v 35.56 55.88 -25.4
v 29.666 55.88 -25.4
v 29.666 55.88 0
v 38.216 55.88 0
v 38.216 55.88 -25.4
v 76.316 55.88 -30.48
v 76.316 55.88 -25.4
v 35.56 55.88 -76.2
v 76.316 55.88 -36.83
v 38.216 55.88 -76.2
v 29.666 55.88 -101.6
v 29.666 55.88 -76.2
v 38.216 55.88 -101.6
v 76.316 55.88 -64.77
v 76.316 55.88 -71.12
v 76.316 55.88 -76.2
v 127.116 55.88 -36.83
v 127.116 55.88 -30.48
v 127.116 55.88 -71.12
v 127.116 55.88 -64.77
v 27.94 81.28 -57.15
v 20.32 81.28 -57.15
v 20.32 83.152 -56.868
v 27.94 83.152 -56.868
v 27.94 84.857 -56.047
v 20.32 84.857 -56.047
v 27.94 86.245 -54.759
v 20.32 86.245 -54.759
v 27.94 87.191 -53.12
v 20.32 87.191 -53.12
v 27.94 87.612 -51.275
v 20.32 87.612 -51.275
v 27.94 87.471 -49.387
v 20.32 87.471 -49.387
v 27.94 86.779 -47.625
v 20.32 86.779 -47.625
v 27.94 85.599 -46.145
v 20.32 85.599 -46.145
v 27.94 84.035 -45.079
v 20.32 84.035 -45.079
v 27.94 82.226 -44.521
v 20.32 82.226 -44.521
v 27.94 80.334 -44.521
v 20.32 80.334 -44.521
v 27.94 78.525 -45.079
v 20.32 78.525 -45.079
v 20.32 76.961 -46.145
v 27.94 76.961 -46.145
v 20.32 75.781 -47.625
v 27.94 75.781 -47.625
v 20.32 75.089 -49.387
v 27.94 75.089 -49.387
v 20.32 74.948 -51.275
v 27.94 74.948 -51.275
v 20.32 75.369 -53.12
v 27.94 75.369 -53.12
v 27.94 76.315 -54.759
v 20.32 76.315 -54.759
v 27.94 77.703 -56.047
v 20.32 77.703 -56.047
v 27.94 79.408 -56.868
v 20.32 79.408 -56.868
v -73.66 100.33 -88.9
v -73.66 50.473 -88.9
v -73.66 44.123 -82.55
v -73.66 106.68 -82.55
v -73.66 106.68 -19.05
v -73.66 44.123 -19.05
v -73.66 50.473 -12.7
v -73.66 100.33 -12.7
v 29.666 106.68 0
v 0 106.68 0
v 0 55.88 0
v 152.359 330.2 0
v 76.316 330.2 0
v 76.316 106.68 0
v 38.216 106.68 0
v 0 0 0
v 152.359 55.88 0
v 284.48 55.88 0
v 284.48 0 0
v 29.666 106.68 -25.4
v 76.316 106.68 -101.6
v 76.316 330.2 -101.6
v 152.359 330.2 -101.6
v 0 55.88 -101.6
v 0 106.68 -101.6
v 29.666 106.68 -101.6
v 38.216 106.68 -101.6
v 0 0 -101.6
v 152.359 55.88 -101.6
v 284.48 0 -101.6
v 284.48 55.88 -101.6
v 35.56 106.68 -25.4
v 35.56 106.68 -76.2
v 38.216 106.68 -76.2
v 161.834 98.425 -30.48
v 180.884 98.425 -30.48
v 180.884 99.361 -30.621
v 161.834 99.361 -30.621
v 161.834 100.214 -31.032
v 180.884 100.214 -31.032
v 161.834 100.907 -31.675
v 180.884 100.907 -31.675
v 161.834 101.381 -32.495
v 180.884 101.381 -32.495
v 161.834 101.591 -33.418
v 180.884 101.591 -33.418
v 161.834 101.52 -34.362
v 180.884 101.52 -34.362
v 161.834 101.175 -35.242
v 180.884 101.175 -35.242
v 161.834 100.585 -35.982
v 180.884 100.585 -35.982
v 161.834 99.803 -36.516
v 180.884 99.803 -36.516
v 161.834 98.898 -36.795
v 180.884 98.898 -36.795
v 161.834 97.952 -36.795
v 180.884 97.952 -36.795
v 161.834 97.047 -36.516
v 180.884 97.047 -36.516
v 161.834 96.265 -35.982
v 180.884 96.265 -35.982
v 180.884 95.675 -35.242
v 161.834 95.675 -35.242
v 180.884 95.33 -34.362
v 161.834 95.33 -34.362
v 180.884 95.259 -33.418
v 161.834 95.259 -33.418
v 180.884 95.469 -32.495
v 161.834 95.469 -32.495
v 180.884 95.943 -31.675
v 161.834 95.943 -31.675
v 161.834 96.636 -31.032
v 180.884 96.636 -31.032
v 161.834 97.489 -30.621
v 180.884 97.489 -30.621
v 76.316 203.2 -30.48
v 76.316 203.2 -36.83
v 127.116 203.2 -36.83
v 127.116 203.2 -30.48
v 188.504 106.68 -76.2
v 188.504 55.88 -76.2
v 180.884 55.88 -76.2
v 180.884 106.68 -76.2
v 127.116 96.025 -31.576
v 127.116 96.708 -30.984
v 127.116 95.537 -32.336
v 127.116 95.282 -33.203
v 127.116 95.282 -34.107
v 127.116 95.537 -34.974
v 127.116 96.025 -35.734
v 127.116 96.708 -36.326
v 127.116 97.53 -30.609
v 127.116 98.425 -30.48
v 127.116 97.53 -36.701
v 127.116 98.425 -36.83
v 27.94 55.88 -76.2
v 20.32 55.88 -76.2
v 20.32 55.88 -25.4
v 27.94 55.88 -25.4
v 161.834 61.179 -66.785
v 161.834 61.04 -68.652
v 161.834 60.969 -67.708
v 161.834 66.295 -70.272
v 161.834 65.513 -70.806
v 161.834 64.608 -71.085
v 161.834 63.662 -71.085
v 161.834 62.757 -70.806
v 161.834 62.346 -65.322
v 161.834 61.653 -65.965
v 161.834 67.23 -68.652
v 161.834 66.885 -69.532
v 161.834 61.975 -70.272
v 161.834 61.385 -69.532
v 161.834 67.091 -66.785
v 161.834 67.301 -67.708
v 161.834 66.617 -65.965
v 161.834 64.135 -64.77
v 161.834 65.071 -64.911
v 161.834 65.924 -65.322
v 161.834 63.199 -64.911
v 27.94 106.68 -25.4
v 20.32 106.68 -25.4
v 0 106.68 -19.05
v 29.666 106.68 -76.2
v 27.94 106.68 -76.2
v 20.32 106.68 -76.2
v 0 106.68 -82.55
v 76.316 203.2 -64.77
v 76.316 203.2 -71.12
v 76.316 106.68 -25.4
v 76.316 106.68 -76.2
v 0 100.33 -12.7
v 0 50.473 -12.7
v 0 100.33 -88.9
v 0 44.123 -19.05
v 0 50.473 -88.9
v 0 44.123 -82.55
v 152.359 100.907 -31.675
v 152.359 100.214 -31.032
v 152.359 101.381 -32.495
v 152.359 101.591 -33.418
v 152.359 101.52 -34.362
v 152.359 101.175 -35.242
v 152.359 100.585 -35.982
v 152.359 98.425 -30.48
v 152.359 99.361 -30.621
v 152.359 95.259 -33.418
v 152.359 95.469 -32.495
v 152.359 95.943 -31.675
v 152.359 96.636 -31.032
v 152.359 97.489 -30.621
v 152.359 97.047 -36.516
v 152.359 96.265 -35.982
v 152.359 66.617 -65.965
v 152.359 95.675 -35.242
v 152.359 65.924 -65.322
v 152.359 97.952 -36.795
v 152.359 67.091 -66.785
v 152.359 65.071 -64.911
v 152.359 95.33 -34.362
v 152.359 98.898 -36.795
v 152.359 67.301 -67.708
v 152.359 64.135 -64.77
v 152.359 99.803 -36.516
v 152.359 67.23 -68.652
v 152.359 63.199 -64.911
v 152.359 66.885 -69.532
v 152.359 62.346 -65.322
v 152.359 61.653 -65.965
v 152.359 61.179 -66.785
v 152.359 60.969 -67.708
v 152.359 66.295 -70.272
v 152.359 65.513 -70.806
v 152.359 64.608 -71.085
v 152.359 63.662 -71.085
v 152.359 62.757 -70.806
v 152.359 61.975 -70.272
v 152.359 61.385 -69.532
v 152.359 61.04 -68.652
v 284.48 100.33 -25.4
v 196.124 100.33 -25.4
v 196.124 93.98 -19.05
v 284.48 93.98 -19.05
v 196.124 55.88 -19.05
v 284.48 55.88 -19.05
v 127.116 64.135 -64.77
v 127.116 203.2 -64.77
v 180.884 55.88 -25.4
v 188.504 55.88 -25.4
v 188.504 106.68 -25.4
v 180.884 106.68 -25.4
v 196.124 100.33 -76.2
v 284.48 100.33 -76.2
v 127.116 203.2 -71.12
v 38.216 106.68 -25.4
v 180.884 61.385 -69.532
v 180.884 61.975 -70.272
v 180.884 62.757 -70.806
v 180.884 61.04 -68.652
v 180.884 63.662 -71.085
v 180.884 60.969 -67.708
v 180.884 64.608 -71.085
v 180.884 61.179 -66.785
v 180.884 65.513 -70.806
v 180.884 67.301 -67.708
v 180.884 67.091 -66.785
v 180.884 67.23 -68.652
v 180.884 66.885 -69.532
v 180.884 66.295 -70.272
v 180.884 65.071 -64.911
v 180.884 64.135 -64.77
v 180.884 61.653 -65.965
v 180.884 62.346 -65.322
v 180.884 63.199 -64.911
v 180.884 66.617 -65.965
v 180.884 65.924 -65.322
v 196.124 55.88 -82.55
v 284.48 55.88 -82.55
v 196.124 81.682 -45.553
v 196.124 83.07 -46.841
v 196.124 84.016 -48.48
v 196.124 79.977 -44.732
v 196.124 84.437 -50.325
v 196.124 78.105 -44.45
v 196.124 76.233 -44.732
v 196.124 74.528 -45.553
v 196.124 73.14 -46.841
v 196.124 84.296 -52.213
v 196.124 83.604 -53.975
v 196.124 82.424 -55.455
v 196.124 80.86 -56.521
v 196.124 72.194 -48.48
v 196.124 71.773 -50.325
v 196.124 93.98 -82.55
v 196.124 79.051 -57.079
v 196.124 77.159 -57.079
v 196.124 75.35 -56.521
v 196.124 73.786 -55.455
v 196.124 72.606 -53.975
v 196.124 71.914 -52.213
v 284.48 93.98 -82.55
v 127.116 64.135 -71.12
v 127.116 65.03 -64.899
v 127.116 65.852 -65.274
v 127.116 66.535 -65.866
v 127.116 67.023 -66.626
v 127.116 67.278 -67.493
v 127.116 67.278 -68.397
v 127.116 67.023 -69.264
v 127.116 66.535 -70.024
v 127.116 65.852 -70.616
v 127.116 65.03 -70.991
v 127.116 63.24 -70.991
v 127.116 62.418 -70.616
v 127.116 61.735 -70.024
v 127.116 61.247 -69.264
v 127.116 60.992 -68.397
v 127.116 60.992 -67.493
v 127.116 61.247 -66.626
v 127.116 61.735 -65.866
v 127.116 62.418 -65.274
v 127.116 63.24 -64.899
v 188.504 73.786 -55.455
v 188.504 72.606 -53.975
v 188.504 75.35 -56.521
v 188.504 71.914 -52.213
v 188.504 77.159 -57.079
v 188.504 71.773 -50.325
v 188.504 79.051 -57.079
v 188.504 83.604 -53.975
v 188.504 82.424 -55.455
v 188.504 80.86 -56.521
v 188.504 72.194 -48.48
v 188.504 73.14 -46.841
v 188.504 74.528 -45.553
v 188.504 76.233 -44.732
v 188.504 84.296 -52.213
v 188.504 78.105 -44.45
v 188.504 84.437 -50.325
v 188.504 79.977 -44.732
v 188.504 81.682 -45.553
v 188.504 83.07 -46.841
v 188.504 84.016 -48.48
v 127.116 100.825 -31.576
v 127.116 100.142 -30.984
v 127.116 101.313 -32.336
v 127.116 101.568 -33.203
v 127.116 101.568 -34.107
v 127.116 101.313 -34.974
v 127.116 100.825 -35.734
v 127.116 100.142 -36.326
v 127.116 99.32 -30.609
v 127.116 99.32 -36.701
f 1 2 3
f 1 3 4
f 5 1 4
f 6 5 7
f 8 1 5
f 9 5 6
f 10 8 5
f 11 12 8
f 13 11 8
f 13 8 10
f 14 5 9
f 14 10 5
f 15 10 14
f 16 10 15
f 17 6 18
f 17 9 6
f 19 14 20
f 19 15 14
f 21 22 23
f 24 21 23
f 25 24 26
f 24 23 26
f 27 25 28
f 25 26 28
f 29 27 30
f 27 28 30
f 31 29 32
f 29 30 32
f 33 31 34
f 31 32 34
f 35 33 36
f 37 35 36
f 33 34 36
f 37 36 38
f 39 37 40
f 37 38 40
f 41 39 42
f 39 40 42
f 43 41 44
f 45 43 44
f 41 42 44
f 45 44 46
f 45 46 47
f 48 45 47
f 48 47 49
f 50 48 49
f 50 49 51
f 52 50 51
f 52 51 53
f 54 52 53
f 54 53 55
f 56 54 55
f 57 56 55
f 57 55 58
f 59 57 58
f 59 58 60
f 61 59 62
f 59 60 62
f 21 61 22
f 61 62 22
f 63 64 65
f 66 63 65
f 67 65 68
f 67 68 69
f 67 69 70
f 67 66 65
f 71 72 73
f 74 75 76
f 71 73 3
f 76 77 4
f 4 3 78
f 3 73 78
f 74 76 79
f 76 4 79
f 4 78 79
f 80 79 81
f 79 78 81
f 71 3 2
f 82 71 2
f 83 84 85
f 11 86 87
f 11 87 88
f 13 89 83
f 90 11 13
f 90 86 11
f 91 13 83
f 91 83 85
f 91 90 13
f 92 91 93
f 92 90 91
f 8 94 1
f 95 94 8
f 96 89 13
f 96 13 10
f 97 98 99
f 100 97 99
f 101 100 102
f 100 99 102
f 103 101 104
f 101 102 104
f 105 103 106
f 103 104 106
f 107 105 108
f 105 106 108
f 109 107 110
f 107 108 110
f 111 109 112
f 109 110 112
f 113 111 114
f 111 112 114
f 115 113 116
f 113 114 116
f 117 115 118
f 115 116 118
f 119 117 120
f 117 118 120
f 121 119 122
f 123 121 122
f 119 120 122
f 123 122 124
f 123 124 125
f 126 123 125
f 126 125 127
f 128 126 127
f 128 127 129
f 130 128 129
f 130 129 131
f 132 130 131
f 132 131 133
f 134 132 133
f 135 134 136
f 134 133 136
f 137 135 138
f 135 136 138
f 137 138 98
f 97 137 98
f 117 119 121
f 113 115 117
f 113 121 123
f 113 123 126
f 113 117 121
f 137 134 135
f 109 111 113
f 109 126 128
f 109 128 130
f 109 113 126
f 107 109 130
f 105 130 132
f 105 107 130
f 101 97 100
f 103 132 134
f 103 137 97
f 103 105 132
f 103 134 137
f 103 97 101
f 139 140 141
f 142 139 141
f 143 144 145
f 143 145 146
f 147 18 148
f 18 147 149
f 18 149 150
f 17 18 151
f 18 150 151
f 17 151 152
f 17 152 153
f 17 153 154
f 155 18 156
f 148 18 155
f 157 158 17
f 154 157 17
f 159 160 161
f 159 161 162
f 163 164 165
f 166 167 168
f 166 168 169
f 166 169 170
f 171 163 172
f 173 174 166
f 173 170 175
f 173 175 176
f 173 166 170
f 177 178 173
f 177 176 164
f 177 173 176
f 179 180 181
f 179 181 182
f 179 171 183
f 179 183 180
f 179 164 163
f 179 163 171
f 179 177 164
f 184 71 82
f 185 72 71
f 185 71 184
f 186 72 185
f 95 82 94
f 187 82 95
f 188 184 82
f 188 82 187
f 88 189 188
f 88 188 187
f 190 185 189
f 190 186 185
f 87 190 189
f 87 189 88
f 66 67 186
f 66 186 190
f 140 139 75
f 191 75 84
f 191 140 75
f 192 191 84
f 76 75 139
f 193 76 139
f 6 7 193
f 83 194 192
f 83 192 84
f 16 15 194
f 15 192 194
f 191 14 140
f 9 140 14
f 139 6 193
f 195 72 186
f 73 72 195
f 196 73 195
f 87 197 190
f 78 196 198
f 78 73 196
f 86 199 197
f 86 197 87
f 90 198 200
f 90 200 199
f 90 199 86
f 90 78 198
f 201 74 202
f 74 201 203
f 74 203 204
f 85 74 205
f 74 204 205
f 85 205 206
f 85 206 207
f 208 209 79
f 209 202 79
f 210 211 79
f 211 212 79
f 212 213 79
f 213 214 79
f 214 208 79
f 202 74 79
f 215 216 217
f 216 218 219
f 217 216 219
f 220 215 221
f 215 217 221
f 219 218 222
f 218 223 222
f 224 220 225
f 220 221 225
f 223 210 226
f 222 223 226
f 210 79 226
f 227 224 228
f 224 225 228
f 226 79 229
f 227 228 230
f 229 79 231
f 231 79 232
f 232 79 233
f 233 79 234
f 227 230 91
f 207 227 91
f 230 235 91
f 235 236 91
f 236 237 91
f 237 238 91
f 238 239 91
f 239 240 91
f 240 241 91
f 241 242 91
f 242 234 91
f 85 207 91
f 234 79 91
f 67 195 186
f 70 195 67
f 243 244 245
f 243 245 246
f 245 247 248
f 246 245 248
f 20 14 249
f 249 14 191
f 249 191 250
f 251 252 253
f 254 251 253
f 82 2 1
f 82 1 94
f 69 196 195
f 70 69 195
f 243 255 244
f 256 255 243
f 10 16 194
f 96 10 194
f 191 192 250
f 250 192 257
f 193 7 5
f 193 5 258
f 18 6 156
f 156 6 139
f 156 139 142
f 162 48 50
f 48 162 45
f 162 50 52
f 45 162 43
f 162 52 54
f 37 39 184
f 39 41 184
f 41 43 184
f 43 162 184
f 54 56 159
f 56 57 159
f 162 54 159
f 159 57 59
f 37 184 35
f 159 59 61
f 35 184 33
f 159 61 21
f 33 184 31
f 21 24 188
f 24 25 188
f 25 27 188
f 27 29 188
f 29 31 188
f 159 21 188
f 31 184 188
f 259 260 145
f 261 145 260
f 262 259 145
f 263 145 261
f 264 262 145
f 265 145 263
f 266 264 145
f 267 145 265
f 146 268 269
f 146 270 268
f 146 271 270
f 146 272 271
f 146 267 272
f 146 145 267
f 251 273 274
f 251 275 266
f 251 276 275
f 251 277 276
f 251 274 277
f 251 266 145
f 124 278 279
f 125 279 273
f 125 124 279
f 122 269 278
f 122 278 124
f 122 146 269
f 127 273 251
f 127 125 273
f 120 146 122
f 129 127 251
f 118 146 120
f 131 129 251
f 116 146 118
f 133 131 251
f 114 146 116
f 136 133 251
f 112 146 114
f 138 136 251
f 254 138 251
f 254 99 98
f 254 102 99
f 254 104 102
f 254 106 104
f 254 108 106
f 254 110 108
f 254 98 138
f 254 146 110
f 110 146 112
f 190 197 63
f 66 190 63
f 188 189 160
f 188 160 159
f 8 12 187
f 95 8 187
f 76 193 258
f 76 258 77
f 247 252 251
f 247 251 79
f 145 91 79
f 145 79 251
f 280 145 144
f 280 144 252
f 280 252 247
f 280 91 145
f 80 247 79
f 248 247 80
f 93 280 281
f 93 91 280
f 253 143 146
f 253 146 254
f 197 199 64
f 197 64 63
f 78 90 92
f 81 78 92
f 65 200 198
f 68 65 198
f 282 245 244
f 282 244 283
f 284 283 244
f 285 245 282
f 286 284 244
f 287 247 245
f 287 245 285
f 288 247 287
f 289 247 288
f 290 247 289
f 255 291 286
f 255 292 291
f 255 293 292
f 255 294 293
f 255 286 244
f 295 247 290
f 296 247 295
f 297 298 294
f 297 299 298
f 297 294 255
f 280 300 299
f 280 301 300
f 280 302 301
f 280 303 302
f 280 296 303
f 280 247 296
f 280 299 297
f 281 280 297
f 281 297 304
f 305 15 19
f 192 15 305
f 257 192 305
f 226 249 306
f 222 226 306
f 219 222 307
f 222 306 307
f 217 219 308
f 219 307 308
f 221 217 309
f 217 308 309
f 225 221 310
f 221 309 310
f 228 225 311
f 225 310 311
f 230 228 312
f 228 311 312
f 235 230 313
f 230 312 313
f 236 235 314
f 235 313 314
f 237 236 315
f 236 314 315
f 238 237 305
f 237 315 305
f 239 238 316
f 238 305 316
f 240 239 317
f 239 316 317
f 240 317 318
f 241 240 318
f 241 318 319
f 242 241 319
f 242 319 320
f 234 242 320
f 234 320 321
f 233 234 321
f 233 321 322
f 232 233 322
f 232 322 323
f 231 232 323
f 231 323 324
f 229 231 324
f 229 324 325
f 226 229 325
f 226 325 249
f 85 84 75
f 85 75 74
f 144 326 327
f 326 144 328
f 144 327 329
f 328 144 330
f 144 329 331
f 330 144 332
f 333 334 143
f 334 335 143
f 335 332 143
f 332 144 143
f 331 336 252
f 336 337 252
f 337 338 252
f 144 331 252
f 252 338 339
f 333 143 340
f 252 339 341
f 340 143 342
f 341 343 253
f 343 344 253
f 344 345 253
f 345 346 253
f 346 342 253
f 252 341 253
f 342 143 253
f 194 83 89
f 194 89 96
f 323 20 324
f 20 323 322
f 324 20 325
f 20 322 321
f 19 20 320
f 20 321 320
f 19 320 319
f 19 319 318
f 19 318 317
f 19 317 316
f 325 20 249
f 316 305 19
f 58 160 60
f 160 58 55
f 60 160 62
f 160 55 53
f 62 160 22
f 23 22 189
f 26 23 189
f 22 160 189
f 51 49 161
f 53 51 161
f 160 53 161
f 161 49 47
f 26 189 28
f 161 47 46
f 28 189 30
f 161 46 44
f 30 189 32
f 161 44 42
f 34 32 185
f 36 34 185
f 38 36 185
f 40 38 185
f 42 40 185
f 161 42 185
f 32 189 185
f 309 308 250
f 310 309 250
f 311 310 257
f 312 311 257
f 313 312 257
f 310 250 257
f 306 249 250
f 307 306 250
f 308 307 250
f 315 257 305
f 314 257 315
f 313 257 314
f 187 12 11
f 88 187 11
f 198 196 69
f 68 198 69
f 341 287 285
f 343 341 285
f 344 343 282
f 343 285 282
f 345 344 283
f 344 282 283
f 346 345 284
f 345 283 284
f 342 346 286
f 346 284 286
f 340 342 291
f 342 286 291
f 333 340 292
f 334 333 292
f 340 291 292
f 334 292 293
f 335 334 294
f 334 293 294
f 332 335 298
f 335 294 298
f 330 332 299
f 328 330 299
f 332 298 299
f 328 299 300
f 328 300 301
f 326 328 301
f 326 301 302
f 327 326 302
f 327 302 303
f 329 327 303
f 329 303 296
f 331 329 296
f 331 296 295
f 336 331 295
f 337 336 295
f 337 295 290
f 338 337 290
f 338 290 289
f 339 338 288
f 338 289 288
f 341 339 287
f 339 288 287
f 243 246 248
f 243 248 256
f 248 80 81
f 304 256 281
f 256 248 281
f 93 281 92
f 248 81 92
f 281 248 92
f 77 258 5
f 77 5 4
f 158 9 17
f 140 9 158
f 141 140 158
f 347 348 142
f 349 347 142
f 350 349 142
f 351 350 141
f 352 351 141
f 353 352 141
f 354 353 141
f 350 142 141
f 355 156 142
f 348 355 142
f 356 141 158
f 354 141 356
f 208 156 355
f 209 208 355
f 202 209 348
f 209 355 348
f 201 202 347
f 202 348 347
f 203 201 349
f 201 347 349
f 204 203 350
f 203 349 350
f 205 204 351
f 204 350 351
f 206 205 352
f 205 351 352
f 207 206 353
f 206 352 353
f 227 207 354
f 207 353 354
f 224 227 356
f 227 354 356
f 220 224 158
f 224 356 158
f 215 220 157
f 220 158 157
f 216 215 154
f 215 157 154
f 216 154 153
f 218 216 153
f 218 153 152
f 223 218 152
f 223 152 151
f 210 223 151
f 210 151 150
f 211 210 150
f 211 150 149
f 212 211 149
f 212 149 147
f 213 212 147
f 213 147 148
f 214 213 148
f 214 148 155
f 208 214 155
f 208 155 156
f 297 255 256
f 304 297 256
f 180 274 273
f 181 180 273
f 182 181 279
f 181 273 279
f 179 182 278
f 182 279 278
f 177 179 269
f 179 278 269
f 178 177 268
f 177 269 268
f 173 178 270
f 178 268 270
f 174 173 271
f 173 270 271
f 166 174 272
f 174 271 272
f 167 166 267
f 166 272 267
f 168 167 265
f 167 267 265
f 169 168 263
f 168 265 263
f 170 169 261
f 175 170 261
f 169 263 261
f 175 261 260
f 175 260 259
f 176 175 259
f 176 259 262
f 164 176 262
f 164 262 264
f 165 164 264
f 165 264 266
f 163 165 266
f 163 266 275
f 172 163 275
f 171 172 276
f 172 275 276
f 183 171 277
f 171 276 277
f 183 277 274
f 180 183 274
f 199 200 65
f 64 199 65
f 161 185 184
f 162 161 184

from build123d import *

# Parameters (mm, degrees)
SKETCH1_W            = 284.48
SKETCH1_H            = 101.6
BOSS_EXTRUDE1_DEPTH  = 55.88
SKETCH2_W            = 76.042421072
SKETCH2_H            = 101.6
BOSS_EXTRUDE2_DEPTH  = 274.32
SKETCH3_W            = 68.280460578
SKETCH3_H            = 6.35
CUT_EXTRUDE1_DEPTH   = 147.32
SKETCH4_R            = 3.175
CUT_EXTRUDE2_DEPTH   = 274.32
SKETCH5_W            = 25.4
SKETCH5_H            = 50.8
BOSS_EXTRUDE4_DEPTH  = 38.1
SKETCH6_W            = 29.665893143
SKETCH6_H            = 25.4
BOSS_EXTRUDE5_DEPTH  = 50.8
SKETCH7_W            = 76.2
SKETCH7_H            = 62.556650574
BOSS_EXTRUDE6_DEPTH  = 93.98
SKETCH8_R            = 6.35
BOSS_EXTRUDE7_DEPTH  = 7.62
SKETCH9_W            = 50.8
SKETCH9_H            = 50.8
BOSS_EXTRUDE8_DEPTH  = 7.62
SKETCH11_W           = 88.356231919
SKETCH11_H           = 63.5
BOSS_EXTRUDE9_DEPTH  = 44.45
SKETCH13_R           = 6.35
BOSS_EXTRUDE10_DEPTH = 7.62
SKETCH14_W           = 50.8
SKETCH14_H           = 50.8
BOSS_EXTRUDE11_DEPTH = 7.62
SKETCH15_R           = 3.175
BOSS_EXTRUDE12_DEPTH = 19.05
CHAMFER2_SIZE        = 6.35


with BuildPart() as part:
    # Sketch1 → Boss-Extrude1 (new body)
    with BuildSketch(Plane(origin=(0, 0, 0), x_dir=(1, 0, 0), z_dir=(0, 1, 0))):
        with Locations((142.24, 50.8)):
            Rectangle(SKETCH1_W, SKETCH1_H)
    extrude(amount=BOSS_EXTRUDE1_DEPTH)

    # Sketch2 → Boss-Extrude2 (add)
    with BuildSketch(Plane(origin=(0, 55.88, 0), x_dir=(1, 0, 0), z_dir=(0, 1, 0))):
        with Locations((114.337337429, 50.8)):
            Rectangle(SKETCH2_W, SKETCH2_H)
    extrude(amount=BOSS_EXTRUDE2_DEPTH)

    # Sketch3 → Cut-Extrude1 (cut)
    with BuildSketch(Plane(origin=(0, 203.2, 0), x_dir=(1, 0, 0), z_dir=(0, 1, 0))):
        with Locations((92.975896604, 33.655)):
            Rectangle(SKETCH3_W, SKETCH3_H)
        with Locations((92.975896604, 67.945)):
            Rectangle(SKETCH3_W, SKETCH3_H)
    extrude(amount=-CUT_EXTRUDE1_DEPTH, mode=Mode.SUBTRACT)

    # Sketch4 → Cut-Extrude2 (cut)
    with BuildSketch(Plane.ZY.offset(-127.116126893)):
        with Locations((-33.655, 98.425)):
            Circle(SKETCH4_R)
        with Locations((-67.945, 64.135)):
            Circle(SKETCH4_R)
    extrude(amount=-CUT_EXTRUDE2_DEPTH, mode=Mode.SUBTRACT)

    # Sketch5 → Boss-Extrude4 (add)
    with BuildSketch(Plane.ZY.offset(-76.316126893)):
        with Locations((-88.9, 81.28)):
            Rectangle(SKETCH5_W, SKETCH5_H)
        with Locations((-12.7, 81.28)):
            Rectangle(SKETCH5_W, SKETCH5_H)
    extrude(amount=BOSS_EXTRUDE4_DEPTH)

    # Sketch6 → Boss-Extrude5 (add)
    with BuildSketch(Plane(origin=(0, 55.88, 0), x_dir=(1, 0, 0), z_dir=(0, 1, 0))):
        with Locations((14.832946572, 88.9)):
            Rectangle(SKETCH6_W, SKETCH6_H)
        with Locations((14.832946572, 12.7)):
            Rectangle(SKETCH6_W, SKETCH6_H)
    extrude(amount=BOSS_EXTRUDE5_DEPTH)

    # Sketch7 → Boss-Extrude6 (add)
    with BuildSketch(Plane.ZY.offset(-20.32)):
        with Locations((-50.8, 75.401674713)):
            Rectangle(SKETCH7_W, SKETCH7_H)
    extrude(amount=BOSS_EXTRUDE6_DEPTH)

    # Sketch8 → Boss-Extrude7 (add)
    with BuildSketch(Plane(origin=(20.32, 0, 0), x_dir=(0, 0, -1), z_dir=(1, 0, 0))):
        with Locations((50.8, 81.28)):
            Circle(SKETCH8_R)
    extrude(amount=BOSS_EXTRUDE7_DEPTH)

    # Sketch9 → Boss-Extrude8 (add)
    with BuildSketch(Plane(origin=(27.94, 0, 0), x_dir=(0, 0, -1), z_dir=(1, 0, 0))):
        with Locations((50.8, 81.28)):
            Rectangle(SKETCH9_W, SKETCH9_H)
    extrude(amount=BOSS_EXTRUDE8_DEPTH)

    # Sketch11 → Boss-Extrude9 (add)
    with BuildSketch(Plane(origin=(0, 55.88, 0), x_dir=(1, 0, 0), z_dir=(0, 1, 0))):
        with Locations((240.30188404, 50.8)):
            Rectangle(SKETCH11_W, SKETCH11_H)
    extrude(amount=BOSS_EXTRUDE9_DEPTH)

    # Sketch13 → Boss-Extrude10 (add)
    with BuildSketch(Plane.ZY.offset(-196.123768081)):
        with Locations((-50.8, 78.105)):
            Circle(SKETCH13_R)
    extrude(amount=BOSS_EXTRUDE10_DEPTH)

    # Sketch14 → Boss-Extrude11 (add)
    with BuildSketch(Plane.ZY.offset(-188.503768081)):
        with Locations((-50.8, 81.28)):
            Rectangle(SKETCH14_W, SKETCH14_H)
    extrude(amount=BOSS_EXTRUDE11_DEPTH)

    # Sketch15 → Boss-Extrude12 (add)
    with BuildSketch(Plane.ZY.offset(-180.883768081)):
        with Locations((-33.655, 98.425)):
            Circle(SKETCH15_R)
        with Locations((-67.945, 64.135)):
            Circle(SKETCH15_R)
    extrude(amount=BOSS_EXTRUDE12_DEPTH)

    # Chamfer2
    chamfer2_edges = [part.edges().sort_by_distance(p)[0] for p in [
        (-36.83, 44.123349426, -88.9),
        (-36.83, 106.68, -88.9),
        (-36.83, 106.68, -12.7),
        (-36.83, 44.123349426, -12.7),
        (240.301884041, 100.33, -82.55),
        (240.301884041, 100.33, -19.05),
    ]]
    chamfer(chamfer2_edges, length=CHAMFER2_SIZE)


solid = part.part
